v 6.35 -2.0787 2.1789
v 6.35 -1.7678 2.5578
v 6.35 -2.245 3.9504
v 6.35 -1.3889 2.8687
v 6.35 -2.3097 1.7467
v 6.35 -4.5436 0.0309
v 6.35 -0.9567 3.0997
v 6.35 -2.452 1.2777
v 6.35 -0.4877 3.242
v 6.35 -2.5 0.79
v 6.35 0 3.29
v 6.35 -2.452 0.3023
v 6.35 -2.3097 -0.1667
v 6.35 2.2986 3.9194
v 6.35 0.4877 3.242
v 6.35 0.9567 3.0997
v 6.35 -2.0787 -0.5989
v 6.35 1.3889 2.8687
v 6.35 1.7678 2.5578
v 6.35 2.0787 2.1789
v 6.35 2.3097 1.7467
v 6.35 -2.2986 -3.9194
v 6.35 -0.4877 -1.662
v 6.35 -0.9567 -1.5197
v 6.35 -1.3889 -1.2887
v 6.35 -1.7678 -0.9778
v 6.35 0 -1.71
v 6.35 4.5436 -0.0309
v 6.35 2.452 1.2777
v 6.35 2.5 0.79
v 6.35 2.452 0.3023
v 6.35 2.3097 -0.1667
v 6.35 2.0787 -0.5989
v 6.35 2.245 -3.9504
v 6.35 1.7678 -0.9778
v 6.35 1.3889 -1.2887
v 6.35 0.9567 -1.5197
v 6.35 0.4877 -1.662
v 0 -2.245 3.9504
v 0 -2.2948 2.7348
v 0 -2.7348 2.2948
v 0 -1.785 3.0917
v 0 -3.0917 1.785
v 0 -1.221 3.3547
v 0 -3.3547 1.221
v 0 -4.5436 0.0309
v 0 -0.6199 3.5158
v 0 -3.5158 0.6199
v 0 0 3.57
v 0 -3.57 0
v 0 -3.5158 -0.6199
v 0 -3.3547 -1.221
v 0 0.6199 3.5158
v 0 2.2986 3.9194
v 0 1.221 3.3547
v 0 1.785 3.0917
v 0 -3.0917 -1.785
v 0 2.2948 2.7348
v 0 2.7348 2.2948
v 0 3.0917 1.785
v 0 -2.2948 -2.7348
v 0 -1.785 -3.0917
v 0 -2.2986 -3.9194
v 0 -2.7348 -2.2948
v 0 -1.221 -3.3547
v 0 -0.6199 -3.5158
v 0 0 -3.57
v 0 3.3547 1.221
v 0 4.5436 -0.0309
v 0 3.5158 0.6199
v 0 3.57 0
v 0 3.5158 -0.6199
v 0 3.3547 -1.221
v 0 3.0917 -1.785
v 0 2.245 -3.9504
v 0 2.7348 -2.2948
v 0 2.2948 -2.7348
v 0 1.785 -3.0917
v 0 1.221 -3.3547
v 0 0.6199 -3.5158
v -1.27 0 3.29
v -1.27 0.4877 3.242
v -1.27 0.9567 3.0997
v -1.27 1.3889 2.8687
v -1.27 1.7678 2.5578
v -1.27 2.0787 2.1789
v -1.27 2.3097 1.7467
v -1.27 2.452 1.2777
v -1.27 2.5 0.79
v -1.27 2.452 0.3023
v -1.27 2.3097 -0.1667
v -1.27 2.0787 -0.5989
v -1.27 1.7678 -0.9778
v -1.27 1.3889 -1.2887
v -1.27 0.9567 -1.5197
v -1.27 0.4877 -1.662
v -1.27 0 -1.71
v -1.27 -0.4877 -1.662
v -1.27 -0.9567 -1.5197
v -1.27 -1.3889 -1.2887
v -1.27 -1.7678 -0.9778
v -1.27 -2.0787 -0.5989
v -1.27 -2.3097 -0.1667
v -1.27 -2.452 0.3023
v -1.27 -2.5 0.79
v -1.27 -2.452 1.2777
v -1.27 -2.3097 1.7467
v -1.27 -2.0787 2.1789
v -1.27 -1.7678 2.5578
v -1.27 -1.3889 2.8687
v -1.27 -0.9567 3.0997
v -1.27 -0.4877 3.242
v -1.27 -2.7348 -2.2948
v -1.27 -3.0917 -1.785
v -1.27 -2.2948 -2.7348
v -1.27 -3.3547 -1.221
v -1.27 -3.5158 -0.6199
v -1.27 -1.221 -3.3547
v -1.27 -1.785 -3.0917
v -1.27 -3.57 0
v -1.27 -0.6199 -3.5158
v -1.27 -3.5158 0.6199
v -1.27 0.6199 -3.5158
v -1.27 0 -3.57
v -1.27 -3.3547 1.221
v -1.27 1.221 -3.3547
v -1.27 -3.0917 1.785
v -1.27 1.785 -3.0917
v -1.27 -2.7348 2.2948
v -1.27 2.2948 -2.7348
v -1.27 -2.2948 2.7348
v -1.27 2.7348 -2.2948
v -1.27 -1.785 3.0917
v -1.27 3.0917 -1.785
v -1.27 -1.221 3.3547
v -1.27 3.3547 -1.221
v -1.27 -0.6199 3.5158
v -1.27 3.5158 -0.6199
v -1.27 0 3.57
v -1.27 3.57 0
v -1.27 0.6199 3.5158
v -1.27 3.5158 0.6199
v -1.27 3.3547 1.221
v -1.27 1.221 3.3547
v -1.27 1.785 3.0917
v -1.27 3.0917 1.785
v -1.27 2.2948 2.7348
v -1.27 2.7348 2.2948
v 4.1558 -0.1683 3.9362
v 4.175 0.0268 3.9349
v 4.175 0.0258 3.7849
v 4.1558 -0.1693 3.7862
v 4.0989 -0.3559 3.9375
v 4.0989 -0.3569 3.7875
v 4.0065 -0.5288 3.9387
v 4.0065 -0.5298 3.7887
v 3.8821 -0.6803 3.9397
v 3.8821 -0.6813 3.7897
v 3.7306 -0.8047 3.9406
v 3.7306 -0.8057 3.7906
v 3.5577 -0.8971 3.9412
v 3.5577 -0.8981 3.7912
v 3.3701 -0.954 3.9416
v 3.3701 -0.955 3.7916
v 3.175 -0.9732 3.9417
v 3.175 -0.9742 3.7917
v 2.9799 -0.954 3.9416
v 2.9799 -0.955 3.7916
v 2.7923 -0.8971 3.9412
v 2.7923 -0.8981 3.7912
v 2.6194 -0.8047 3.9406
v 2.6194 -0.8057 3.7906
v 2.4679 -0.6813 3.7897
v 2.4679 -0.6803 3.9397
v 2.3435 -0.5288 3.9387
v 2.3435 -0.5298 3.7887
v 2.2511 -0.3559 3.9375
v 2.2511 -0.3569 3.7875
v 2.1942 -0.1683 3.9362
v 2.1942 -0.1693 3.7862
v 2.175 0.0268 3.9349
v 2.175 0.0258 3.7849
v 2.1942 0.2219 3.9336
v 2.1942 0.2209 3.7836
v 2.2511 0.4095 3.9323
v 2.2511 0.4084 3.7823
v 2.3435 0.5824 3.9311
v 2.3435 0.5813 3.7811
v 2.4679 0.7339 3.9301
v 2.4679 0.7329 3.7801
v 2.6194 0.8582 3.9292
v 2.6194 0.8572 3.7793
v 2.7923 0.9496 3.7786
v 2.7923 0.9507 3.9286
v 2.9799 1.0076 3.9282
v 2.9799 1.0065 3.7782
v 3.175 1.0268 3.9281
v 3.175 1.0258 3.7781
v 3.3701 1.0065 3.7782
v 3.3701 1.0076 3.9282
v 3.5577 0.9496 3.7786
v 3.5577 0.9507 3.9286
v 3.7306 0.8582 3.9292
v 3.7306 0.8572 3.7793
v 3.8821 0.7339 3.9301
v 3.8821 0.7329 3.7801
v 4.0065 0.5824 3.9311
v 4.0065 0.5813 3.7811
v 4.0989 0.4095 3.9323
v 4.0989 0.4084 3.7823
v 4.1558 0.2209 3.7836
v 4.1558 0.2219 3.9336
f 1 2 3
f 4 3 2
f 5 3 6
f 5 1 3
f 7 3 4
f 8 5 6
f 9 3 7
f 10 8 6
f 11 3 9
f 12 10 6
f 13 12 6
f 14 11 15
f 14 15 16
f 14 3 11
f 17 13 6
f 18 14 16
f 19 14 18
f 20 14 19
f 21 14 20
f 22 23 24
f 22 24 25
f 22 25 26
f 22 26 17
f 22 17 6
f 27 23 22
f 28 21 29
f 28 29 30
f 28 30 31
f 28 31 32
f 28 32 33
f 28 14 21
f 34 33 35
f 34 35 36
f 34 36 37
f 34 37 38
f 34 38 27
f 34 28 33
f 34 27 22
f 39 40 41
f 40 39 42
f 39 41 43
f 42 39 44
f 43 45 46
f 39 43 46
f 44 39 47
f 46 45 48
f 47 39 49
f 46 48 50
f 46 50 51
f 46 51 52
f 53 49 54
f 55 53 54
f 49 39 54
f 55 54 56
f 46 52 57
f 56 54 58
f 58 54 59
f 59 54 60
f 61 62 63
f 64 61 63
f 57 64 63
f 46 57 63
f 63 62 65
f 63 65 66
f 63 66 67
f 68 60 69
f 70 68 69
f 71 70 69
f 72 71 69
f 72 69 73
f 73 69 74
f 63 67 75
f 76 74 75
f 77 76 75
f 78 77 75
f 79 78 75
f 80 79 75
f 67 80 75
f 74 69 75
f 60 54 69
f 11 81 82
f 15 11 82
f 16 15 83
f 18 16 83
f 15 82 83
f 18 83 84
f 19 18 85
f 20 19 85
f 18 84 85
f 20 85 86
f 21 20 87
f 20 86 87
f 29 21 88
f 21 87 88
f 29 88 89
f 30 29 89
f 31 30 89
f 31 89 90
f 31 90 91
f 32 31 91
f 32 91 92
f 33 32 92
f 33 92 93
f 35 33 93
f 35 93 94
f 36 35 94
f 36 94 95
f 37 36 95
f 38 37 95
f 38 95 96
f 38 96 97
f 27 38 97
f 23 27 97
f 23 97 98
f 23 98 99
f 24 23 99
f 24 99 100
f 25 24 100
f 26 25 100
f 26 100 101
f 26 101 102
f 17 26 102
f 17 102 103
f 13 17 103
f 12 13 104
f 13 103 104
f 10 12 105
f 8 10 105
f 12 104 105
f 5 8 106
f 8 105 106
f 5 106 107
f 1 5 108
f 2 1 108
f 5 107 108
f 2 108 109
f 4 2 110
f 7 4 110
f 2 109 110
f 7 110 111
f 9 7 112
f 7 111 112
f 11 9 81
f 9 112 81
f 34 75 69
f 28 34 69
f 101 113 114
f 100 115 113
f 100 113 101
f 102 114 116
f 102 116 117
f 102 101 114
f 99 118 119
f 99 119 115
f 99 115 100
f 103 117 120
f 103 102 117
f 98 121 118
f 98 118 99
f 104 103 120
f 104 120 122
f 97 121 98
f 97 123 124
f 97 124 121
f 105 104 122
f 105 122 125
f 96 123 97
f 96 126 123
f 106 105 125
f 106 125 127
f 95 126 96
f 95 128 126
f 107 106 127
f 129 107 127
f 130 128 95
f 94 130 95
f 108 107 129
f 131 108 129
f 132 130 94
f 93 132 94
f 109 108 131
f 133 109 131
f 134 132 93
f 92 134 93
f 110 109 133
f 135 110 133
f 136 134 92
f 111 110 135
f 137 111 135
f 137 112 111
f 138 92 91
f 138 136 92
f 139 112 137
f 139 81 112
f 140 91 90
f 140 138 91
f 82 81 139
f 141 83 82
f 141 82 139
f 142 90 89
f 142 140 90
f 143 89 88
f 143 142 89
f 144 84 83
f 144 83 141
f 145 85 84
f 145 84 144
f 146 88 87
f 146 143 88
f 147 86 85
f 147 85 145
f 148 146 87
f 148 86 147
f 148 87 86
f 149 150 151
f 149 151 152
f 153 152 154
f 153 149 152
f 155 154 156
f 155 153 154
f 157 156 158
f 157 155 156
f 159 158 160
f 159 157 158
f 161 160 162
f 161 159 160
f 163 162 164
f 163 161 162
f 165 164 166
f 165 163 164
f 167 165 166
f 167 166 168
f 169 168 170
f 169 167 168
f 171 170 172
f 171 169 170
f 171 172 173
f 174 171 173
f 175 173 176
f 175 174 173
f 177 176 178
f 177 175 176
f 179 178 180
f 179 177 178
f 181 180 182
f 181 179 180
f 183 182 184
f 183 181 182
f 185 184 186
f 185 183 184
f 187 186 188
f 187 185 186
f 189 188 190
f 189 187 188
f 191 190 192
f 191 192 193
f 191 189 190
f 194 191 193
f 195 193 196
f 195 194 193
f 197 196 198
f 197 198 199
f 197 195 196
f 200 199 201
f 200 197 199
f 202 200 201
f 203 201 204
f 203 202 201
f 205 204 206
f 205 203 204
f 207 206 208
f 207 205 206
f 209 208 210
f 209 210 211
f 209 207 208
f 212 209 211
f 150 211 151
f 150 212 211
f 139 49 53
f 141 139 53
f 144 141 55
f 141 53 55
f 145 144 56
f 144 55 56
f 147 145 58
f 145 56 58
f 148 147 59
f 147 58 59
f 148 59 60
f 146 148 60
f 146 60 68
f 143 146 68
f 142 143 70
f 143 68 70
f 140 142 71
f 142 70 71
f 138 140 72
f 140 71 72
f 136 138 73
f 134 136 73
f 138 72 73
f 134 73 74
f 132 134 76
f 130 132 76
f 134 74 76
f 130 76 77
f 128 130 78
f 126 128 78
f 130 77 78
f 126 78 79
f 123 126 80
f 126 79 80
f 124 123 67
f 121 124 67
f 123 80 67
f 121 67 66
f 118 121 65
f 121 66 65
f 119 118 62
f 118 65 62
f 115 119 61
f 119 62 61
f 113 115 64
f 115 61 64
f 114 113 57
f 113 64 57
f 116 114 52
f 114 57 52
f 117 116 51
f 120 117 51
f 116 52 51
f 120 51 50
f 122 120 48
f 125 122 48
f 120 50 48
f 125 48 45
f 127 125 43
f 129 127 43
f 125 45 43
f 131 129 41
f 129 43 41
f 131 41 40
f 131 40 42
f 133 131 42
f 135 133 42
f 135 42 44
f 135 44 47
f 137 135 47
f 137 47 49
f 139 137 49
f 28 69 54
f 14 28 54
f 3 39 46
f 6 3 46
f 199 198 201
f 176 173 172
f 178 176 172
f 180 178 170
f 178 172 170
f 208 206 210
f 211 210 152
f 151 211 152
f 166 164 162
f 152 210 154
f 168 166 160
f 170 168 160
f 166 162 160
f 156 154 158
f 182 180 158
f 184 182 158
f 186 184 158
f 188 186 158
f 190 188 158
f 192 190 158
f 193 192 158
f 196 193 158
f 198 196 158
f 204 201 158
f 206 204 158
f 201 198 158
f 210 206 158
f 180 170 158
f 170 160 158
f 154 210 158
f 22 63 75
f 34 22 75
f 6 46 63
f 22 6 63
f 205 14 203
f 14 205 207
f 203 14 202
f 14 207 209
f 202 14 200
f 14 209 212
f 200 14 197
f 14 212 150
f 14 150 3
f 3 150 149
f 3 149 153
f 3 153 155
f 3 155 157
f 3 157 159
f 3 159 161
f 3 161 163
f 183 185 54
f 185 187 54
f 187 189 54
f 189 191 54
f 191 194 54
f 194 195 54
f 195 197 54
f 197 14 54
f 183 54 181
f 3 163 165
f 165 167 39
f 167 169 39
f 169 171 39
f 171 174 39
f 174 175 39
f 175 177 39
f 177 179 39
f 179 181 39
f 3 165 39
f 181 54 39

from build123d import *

# Parameters (mm, degrees)
BOSS_EXTRUDE1_DEPTH = 6.35
SKETCH4_R           = 3.57
BOSS_EXTRUDE2_DEPTH = 1.27
SKETCH3_R           = 2.5
CUT_EXTRUDE1_DEPTH  = 8.62
SKETCH5_R           = 1
CUT_EXTRUDE3_DEPTH  = 0.15


with BuildPart() as part:
    # Sketch2 → Boss-Extrude1 (new body)
    with BuildSketch(Plane(origin=(0, 0, 0), x_dir=(0, 0, -1), z_dir=(1, 0, 0))):
        Polygon((3.919437566, -2.29861752), (3.950379949, 2.245023741), (0.030942383, 4.54364126), (-3.919437566, 2.29861752), (-3.950379949, -2.245023741), (-0.030942383, -4.54364126), align=None)
    extrude(amount=BOSS_EXTRUDE1_DEPTH)

    # Sketch4 → Boss-Extrude2 (add)
    with BuildSketch(Plane.ZY):
        Circle(SKETCH4_R)
    extrude(amount=BOSS_EXTRUDE2_DEPTH)

    # Sketch3 → Cut-Extrude1 (cut, through all)
    with BuildSketch(Plane.ZY.offset(1.27)):
        with Locations((0.79, 0)):
            Circle(SKETCH3_R)
    extrude(amount=-CUT_EXTRUDE1_DEPTH, mode=Mode.SUBTRACT)

    # Sketch5 → Cut-Extrude3 (cut)
    with BuildSketch(Plane(origin=(0, 0.02679689, 3.934908757), x_dir=(1, 0, 0), z_dir=(0, -0.006809883, -0.999976812))):
        with Locations((3.175, 0)):
            Circle(SKETCH5_R)
    extrude(amount=CUT_EXTRUDE3_DEPTH, mode=Mode.SUBTRACT)


solid = part.part
